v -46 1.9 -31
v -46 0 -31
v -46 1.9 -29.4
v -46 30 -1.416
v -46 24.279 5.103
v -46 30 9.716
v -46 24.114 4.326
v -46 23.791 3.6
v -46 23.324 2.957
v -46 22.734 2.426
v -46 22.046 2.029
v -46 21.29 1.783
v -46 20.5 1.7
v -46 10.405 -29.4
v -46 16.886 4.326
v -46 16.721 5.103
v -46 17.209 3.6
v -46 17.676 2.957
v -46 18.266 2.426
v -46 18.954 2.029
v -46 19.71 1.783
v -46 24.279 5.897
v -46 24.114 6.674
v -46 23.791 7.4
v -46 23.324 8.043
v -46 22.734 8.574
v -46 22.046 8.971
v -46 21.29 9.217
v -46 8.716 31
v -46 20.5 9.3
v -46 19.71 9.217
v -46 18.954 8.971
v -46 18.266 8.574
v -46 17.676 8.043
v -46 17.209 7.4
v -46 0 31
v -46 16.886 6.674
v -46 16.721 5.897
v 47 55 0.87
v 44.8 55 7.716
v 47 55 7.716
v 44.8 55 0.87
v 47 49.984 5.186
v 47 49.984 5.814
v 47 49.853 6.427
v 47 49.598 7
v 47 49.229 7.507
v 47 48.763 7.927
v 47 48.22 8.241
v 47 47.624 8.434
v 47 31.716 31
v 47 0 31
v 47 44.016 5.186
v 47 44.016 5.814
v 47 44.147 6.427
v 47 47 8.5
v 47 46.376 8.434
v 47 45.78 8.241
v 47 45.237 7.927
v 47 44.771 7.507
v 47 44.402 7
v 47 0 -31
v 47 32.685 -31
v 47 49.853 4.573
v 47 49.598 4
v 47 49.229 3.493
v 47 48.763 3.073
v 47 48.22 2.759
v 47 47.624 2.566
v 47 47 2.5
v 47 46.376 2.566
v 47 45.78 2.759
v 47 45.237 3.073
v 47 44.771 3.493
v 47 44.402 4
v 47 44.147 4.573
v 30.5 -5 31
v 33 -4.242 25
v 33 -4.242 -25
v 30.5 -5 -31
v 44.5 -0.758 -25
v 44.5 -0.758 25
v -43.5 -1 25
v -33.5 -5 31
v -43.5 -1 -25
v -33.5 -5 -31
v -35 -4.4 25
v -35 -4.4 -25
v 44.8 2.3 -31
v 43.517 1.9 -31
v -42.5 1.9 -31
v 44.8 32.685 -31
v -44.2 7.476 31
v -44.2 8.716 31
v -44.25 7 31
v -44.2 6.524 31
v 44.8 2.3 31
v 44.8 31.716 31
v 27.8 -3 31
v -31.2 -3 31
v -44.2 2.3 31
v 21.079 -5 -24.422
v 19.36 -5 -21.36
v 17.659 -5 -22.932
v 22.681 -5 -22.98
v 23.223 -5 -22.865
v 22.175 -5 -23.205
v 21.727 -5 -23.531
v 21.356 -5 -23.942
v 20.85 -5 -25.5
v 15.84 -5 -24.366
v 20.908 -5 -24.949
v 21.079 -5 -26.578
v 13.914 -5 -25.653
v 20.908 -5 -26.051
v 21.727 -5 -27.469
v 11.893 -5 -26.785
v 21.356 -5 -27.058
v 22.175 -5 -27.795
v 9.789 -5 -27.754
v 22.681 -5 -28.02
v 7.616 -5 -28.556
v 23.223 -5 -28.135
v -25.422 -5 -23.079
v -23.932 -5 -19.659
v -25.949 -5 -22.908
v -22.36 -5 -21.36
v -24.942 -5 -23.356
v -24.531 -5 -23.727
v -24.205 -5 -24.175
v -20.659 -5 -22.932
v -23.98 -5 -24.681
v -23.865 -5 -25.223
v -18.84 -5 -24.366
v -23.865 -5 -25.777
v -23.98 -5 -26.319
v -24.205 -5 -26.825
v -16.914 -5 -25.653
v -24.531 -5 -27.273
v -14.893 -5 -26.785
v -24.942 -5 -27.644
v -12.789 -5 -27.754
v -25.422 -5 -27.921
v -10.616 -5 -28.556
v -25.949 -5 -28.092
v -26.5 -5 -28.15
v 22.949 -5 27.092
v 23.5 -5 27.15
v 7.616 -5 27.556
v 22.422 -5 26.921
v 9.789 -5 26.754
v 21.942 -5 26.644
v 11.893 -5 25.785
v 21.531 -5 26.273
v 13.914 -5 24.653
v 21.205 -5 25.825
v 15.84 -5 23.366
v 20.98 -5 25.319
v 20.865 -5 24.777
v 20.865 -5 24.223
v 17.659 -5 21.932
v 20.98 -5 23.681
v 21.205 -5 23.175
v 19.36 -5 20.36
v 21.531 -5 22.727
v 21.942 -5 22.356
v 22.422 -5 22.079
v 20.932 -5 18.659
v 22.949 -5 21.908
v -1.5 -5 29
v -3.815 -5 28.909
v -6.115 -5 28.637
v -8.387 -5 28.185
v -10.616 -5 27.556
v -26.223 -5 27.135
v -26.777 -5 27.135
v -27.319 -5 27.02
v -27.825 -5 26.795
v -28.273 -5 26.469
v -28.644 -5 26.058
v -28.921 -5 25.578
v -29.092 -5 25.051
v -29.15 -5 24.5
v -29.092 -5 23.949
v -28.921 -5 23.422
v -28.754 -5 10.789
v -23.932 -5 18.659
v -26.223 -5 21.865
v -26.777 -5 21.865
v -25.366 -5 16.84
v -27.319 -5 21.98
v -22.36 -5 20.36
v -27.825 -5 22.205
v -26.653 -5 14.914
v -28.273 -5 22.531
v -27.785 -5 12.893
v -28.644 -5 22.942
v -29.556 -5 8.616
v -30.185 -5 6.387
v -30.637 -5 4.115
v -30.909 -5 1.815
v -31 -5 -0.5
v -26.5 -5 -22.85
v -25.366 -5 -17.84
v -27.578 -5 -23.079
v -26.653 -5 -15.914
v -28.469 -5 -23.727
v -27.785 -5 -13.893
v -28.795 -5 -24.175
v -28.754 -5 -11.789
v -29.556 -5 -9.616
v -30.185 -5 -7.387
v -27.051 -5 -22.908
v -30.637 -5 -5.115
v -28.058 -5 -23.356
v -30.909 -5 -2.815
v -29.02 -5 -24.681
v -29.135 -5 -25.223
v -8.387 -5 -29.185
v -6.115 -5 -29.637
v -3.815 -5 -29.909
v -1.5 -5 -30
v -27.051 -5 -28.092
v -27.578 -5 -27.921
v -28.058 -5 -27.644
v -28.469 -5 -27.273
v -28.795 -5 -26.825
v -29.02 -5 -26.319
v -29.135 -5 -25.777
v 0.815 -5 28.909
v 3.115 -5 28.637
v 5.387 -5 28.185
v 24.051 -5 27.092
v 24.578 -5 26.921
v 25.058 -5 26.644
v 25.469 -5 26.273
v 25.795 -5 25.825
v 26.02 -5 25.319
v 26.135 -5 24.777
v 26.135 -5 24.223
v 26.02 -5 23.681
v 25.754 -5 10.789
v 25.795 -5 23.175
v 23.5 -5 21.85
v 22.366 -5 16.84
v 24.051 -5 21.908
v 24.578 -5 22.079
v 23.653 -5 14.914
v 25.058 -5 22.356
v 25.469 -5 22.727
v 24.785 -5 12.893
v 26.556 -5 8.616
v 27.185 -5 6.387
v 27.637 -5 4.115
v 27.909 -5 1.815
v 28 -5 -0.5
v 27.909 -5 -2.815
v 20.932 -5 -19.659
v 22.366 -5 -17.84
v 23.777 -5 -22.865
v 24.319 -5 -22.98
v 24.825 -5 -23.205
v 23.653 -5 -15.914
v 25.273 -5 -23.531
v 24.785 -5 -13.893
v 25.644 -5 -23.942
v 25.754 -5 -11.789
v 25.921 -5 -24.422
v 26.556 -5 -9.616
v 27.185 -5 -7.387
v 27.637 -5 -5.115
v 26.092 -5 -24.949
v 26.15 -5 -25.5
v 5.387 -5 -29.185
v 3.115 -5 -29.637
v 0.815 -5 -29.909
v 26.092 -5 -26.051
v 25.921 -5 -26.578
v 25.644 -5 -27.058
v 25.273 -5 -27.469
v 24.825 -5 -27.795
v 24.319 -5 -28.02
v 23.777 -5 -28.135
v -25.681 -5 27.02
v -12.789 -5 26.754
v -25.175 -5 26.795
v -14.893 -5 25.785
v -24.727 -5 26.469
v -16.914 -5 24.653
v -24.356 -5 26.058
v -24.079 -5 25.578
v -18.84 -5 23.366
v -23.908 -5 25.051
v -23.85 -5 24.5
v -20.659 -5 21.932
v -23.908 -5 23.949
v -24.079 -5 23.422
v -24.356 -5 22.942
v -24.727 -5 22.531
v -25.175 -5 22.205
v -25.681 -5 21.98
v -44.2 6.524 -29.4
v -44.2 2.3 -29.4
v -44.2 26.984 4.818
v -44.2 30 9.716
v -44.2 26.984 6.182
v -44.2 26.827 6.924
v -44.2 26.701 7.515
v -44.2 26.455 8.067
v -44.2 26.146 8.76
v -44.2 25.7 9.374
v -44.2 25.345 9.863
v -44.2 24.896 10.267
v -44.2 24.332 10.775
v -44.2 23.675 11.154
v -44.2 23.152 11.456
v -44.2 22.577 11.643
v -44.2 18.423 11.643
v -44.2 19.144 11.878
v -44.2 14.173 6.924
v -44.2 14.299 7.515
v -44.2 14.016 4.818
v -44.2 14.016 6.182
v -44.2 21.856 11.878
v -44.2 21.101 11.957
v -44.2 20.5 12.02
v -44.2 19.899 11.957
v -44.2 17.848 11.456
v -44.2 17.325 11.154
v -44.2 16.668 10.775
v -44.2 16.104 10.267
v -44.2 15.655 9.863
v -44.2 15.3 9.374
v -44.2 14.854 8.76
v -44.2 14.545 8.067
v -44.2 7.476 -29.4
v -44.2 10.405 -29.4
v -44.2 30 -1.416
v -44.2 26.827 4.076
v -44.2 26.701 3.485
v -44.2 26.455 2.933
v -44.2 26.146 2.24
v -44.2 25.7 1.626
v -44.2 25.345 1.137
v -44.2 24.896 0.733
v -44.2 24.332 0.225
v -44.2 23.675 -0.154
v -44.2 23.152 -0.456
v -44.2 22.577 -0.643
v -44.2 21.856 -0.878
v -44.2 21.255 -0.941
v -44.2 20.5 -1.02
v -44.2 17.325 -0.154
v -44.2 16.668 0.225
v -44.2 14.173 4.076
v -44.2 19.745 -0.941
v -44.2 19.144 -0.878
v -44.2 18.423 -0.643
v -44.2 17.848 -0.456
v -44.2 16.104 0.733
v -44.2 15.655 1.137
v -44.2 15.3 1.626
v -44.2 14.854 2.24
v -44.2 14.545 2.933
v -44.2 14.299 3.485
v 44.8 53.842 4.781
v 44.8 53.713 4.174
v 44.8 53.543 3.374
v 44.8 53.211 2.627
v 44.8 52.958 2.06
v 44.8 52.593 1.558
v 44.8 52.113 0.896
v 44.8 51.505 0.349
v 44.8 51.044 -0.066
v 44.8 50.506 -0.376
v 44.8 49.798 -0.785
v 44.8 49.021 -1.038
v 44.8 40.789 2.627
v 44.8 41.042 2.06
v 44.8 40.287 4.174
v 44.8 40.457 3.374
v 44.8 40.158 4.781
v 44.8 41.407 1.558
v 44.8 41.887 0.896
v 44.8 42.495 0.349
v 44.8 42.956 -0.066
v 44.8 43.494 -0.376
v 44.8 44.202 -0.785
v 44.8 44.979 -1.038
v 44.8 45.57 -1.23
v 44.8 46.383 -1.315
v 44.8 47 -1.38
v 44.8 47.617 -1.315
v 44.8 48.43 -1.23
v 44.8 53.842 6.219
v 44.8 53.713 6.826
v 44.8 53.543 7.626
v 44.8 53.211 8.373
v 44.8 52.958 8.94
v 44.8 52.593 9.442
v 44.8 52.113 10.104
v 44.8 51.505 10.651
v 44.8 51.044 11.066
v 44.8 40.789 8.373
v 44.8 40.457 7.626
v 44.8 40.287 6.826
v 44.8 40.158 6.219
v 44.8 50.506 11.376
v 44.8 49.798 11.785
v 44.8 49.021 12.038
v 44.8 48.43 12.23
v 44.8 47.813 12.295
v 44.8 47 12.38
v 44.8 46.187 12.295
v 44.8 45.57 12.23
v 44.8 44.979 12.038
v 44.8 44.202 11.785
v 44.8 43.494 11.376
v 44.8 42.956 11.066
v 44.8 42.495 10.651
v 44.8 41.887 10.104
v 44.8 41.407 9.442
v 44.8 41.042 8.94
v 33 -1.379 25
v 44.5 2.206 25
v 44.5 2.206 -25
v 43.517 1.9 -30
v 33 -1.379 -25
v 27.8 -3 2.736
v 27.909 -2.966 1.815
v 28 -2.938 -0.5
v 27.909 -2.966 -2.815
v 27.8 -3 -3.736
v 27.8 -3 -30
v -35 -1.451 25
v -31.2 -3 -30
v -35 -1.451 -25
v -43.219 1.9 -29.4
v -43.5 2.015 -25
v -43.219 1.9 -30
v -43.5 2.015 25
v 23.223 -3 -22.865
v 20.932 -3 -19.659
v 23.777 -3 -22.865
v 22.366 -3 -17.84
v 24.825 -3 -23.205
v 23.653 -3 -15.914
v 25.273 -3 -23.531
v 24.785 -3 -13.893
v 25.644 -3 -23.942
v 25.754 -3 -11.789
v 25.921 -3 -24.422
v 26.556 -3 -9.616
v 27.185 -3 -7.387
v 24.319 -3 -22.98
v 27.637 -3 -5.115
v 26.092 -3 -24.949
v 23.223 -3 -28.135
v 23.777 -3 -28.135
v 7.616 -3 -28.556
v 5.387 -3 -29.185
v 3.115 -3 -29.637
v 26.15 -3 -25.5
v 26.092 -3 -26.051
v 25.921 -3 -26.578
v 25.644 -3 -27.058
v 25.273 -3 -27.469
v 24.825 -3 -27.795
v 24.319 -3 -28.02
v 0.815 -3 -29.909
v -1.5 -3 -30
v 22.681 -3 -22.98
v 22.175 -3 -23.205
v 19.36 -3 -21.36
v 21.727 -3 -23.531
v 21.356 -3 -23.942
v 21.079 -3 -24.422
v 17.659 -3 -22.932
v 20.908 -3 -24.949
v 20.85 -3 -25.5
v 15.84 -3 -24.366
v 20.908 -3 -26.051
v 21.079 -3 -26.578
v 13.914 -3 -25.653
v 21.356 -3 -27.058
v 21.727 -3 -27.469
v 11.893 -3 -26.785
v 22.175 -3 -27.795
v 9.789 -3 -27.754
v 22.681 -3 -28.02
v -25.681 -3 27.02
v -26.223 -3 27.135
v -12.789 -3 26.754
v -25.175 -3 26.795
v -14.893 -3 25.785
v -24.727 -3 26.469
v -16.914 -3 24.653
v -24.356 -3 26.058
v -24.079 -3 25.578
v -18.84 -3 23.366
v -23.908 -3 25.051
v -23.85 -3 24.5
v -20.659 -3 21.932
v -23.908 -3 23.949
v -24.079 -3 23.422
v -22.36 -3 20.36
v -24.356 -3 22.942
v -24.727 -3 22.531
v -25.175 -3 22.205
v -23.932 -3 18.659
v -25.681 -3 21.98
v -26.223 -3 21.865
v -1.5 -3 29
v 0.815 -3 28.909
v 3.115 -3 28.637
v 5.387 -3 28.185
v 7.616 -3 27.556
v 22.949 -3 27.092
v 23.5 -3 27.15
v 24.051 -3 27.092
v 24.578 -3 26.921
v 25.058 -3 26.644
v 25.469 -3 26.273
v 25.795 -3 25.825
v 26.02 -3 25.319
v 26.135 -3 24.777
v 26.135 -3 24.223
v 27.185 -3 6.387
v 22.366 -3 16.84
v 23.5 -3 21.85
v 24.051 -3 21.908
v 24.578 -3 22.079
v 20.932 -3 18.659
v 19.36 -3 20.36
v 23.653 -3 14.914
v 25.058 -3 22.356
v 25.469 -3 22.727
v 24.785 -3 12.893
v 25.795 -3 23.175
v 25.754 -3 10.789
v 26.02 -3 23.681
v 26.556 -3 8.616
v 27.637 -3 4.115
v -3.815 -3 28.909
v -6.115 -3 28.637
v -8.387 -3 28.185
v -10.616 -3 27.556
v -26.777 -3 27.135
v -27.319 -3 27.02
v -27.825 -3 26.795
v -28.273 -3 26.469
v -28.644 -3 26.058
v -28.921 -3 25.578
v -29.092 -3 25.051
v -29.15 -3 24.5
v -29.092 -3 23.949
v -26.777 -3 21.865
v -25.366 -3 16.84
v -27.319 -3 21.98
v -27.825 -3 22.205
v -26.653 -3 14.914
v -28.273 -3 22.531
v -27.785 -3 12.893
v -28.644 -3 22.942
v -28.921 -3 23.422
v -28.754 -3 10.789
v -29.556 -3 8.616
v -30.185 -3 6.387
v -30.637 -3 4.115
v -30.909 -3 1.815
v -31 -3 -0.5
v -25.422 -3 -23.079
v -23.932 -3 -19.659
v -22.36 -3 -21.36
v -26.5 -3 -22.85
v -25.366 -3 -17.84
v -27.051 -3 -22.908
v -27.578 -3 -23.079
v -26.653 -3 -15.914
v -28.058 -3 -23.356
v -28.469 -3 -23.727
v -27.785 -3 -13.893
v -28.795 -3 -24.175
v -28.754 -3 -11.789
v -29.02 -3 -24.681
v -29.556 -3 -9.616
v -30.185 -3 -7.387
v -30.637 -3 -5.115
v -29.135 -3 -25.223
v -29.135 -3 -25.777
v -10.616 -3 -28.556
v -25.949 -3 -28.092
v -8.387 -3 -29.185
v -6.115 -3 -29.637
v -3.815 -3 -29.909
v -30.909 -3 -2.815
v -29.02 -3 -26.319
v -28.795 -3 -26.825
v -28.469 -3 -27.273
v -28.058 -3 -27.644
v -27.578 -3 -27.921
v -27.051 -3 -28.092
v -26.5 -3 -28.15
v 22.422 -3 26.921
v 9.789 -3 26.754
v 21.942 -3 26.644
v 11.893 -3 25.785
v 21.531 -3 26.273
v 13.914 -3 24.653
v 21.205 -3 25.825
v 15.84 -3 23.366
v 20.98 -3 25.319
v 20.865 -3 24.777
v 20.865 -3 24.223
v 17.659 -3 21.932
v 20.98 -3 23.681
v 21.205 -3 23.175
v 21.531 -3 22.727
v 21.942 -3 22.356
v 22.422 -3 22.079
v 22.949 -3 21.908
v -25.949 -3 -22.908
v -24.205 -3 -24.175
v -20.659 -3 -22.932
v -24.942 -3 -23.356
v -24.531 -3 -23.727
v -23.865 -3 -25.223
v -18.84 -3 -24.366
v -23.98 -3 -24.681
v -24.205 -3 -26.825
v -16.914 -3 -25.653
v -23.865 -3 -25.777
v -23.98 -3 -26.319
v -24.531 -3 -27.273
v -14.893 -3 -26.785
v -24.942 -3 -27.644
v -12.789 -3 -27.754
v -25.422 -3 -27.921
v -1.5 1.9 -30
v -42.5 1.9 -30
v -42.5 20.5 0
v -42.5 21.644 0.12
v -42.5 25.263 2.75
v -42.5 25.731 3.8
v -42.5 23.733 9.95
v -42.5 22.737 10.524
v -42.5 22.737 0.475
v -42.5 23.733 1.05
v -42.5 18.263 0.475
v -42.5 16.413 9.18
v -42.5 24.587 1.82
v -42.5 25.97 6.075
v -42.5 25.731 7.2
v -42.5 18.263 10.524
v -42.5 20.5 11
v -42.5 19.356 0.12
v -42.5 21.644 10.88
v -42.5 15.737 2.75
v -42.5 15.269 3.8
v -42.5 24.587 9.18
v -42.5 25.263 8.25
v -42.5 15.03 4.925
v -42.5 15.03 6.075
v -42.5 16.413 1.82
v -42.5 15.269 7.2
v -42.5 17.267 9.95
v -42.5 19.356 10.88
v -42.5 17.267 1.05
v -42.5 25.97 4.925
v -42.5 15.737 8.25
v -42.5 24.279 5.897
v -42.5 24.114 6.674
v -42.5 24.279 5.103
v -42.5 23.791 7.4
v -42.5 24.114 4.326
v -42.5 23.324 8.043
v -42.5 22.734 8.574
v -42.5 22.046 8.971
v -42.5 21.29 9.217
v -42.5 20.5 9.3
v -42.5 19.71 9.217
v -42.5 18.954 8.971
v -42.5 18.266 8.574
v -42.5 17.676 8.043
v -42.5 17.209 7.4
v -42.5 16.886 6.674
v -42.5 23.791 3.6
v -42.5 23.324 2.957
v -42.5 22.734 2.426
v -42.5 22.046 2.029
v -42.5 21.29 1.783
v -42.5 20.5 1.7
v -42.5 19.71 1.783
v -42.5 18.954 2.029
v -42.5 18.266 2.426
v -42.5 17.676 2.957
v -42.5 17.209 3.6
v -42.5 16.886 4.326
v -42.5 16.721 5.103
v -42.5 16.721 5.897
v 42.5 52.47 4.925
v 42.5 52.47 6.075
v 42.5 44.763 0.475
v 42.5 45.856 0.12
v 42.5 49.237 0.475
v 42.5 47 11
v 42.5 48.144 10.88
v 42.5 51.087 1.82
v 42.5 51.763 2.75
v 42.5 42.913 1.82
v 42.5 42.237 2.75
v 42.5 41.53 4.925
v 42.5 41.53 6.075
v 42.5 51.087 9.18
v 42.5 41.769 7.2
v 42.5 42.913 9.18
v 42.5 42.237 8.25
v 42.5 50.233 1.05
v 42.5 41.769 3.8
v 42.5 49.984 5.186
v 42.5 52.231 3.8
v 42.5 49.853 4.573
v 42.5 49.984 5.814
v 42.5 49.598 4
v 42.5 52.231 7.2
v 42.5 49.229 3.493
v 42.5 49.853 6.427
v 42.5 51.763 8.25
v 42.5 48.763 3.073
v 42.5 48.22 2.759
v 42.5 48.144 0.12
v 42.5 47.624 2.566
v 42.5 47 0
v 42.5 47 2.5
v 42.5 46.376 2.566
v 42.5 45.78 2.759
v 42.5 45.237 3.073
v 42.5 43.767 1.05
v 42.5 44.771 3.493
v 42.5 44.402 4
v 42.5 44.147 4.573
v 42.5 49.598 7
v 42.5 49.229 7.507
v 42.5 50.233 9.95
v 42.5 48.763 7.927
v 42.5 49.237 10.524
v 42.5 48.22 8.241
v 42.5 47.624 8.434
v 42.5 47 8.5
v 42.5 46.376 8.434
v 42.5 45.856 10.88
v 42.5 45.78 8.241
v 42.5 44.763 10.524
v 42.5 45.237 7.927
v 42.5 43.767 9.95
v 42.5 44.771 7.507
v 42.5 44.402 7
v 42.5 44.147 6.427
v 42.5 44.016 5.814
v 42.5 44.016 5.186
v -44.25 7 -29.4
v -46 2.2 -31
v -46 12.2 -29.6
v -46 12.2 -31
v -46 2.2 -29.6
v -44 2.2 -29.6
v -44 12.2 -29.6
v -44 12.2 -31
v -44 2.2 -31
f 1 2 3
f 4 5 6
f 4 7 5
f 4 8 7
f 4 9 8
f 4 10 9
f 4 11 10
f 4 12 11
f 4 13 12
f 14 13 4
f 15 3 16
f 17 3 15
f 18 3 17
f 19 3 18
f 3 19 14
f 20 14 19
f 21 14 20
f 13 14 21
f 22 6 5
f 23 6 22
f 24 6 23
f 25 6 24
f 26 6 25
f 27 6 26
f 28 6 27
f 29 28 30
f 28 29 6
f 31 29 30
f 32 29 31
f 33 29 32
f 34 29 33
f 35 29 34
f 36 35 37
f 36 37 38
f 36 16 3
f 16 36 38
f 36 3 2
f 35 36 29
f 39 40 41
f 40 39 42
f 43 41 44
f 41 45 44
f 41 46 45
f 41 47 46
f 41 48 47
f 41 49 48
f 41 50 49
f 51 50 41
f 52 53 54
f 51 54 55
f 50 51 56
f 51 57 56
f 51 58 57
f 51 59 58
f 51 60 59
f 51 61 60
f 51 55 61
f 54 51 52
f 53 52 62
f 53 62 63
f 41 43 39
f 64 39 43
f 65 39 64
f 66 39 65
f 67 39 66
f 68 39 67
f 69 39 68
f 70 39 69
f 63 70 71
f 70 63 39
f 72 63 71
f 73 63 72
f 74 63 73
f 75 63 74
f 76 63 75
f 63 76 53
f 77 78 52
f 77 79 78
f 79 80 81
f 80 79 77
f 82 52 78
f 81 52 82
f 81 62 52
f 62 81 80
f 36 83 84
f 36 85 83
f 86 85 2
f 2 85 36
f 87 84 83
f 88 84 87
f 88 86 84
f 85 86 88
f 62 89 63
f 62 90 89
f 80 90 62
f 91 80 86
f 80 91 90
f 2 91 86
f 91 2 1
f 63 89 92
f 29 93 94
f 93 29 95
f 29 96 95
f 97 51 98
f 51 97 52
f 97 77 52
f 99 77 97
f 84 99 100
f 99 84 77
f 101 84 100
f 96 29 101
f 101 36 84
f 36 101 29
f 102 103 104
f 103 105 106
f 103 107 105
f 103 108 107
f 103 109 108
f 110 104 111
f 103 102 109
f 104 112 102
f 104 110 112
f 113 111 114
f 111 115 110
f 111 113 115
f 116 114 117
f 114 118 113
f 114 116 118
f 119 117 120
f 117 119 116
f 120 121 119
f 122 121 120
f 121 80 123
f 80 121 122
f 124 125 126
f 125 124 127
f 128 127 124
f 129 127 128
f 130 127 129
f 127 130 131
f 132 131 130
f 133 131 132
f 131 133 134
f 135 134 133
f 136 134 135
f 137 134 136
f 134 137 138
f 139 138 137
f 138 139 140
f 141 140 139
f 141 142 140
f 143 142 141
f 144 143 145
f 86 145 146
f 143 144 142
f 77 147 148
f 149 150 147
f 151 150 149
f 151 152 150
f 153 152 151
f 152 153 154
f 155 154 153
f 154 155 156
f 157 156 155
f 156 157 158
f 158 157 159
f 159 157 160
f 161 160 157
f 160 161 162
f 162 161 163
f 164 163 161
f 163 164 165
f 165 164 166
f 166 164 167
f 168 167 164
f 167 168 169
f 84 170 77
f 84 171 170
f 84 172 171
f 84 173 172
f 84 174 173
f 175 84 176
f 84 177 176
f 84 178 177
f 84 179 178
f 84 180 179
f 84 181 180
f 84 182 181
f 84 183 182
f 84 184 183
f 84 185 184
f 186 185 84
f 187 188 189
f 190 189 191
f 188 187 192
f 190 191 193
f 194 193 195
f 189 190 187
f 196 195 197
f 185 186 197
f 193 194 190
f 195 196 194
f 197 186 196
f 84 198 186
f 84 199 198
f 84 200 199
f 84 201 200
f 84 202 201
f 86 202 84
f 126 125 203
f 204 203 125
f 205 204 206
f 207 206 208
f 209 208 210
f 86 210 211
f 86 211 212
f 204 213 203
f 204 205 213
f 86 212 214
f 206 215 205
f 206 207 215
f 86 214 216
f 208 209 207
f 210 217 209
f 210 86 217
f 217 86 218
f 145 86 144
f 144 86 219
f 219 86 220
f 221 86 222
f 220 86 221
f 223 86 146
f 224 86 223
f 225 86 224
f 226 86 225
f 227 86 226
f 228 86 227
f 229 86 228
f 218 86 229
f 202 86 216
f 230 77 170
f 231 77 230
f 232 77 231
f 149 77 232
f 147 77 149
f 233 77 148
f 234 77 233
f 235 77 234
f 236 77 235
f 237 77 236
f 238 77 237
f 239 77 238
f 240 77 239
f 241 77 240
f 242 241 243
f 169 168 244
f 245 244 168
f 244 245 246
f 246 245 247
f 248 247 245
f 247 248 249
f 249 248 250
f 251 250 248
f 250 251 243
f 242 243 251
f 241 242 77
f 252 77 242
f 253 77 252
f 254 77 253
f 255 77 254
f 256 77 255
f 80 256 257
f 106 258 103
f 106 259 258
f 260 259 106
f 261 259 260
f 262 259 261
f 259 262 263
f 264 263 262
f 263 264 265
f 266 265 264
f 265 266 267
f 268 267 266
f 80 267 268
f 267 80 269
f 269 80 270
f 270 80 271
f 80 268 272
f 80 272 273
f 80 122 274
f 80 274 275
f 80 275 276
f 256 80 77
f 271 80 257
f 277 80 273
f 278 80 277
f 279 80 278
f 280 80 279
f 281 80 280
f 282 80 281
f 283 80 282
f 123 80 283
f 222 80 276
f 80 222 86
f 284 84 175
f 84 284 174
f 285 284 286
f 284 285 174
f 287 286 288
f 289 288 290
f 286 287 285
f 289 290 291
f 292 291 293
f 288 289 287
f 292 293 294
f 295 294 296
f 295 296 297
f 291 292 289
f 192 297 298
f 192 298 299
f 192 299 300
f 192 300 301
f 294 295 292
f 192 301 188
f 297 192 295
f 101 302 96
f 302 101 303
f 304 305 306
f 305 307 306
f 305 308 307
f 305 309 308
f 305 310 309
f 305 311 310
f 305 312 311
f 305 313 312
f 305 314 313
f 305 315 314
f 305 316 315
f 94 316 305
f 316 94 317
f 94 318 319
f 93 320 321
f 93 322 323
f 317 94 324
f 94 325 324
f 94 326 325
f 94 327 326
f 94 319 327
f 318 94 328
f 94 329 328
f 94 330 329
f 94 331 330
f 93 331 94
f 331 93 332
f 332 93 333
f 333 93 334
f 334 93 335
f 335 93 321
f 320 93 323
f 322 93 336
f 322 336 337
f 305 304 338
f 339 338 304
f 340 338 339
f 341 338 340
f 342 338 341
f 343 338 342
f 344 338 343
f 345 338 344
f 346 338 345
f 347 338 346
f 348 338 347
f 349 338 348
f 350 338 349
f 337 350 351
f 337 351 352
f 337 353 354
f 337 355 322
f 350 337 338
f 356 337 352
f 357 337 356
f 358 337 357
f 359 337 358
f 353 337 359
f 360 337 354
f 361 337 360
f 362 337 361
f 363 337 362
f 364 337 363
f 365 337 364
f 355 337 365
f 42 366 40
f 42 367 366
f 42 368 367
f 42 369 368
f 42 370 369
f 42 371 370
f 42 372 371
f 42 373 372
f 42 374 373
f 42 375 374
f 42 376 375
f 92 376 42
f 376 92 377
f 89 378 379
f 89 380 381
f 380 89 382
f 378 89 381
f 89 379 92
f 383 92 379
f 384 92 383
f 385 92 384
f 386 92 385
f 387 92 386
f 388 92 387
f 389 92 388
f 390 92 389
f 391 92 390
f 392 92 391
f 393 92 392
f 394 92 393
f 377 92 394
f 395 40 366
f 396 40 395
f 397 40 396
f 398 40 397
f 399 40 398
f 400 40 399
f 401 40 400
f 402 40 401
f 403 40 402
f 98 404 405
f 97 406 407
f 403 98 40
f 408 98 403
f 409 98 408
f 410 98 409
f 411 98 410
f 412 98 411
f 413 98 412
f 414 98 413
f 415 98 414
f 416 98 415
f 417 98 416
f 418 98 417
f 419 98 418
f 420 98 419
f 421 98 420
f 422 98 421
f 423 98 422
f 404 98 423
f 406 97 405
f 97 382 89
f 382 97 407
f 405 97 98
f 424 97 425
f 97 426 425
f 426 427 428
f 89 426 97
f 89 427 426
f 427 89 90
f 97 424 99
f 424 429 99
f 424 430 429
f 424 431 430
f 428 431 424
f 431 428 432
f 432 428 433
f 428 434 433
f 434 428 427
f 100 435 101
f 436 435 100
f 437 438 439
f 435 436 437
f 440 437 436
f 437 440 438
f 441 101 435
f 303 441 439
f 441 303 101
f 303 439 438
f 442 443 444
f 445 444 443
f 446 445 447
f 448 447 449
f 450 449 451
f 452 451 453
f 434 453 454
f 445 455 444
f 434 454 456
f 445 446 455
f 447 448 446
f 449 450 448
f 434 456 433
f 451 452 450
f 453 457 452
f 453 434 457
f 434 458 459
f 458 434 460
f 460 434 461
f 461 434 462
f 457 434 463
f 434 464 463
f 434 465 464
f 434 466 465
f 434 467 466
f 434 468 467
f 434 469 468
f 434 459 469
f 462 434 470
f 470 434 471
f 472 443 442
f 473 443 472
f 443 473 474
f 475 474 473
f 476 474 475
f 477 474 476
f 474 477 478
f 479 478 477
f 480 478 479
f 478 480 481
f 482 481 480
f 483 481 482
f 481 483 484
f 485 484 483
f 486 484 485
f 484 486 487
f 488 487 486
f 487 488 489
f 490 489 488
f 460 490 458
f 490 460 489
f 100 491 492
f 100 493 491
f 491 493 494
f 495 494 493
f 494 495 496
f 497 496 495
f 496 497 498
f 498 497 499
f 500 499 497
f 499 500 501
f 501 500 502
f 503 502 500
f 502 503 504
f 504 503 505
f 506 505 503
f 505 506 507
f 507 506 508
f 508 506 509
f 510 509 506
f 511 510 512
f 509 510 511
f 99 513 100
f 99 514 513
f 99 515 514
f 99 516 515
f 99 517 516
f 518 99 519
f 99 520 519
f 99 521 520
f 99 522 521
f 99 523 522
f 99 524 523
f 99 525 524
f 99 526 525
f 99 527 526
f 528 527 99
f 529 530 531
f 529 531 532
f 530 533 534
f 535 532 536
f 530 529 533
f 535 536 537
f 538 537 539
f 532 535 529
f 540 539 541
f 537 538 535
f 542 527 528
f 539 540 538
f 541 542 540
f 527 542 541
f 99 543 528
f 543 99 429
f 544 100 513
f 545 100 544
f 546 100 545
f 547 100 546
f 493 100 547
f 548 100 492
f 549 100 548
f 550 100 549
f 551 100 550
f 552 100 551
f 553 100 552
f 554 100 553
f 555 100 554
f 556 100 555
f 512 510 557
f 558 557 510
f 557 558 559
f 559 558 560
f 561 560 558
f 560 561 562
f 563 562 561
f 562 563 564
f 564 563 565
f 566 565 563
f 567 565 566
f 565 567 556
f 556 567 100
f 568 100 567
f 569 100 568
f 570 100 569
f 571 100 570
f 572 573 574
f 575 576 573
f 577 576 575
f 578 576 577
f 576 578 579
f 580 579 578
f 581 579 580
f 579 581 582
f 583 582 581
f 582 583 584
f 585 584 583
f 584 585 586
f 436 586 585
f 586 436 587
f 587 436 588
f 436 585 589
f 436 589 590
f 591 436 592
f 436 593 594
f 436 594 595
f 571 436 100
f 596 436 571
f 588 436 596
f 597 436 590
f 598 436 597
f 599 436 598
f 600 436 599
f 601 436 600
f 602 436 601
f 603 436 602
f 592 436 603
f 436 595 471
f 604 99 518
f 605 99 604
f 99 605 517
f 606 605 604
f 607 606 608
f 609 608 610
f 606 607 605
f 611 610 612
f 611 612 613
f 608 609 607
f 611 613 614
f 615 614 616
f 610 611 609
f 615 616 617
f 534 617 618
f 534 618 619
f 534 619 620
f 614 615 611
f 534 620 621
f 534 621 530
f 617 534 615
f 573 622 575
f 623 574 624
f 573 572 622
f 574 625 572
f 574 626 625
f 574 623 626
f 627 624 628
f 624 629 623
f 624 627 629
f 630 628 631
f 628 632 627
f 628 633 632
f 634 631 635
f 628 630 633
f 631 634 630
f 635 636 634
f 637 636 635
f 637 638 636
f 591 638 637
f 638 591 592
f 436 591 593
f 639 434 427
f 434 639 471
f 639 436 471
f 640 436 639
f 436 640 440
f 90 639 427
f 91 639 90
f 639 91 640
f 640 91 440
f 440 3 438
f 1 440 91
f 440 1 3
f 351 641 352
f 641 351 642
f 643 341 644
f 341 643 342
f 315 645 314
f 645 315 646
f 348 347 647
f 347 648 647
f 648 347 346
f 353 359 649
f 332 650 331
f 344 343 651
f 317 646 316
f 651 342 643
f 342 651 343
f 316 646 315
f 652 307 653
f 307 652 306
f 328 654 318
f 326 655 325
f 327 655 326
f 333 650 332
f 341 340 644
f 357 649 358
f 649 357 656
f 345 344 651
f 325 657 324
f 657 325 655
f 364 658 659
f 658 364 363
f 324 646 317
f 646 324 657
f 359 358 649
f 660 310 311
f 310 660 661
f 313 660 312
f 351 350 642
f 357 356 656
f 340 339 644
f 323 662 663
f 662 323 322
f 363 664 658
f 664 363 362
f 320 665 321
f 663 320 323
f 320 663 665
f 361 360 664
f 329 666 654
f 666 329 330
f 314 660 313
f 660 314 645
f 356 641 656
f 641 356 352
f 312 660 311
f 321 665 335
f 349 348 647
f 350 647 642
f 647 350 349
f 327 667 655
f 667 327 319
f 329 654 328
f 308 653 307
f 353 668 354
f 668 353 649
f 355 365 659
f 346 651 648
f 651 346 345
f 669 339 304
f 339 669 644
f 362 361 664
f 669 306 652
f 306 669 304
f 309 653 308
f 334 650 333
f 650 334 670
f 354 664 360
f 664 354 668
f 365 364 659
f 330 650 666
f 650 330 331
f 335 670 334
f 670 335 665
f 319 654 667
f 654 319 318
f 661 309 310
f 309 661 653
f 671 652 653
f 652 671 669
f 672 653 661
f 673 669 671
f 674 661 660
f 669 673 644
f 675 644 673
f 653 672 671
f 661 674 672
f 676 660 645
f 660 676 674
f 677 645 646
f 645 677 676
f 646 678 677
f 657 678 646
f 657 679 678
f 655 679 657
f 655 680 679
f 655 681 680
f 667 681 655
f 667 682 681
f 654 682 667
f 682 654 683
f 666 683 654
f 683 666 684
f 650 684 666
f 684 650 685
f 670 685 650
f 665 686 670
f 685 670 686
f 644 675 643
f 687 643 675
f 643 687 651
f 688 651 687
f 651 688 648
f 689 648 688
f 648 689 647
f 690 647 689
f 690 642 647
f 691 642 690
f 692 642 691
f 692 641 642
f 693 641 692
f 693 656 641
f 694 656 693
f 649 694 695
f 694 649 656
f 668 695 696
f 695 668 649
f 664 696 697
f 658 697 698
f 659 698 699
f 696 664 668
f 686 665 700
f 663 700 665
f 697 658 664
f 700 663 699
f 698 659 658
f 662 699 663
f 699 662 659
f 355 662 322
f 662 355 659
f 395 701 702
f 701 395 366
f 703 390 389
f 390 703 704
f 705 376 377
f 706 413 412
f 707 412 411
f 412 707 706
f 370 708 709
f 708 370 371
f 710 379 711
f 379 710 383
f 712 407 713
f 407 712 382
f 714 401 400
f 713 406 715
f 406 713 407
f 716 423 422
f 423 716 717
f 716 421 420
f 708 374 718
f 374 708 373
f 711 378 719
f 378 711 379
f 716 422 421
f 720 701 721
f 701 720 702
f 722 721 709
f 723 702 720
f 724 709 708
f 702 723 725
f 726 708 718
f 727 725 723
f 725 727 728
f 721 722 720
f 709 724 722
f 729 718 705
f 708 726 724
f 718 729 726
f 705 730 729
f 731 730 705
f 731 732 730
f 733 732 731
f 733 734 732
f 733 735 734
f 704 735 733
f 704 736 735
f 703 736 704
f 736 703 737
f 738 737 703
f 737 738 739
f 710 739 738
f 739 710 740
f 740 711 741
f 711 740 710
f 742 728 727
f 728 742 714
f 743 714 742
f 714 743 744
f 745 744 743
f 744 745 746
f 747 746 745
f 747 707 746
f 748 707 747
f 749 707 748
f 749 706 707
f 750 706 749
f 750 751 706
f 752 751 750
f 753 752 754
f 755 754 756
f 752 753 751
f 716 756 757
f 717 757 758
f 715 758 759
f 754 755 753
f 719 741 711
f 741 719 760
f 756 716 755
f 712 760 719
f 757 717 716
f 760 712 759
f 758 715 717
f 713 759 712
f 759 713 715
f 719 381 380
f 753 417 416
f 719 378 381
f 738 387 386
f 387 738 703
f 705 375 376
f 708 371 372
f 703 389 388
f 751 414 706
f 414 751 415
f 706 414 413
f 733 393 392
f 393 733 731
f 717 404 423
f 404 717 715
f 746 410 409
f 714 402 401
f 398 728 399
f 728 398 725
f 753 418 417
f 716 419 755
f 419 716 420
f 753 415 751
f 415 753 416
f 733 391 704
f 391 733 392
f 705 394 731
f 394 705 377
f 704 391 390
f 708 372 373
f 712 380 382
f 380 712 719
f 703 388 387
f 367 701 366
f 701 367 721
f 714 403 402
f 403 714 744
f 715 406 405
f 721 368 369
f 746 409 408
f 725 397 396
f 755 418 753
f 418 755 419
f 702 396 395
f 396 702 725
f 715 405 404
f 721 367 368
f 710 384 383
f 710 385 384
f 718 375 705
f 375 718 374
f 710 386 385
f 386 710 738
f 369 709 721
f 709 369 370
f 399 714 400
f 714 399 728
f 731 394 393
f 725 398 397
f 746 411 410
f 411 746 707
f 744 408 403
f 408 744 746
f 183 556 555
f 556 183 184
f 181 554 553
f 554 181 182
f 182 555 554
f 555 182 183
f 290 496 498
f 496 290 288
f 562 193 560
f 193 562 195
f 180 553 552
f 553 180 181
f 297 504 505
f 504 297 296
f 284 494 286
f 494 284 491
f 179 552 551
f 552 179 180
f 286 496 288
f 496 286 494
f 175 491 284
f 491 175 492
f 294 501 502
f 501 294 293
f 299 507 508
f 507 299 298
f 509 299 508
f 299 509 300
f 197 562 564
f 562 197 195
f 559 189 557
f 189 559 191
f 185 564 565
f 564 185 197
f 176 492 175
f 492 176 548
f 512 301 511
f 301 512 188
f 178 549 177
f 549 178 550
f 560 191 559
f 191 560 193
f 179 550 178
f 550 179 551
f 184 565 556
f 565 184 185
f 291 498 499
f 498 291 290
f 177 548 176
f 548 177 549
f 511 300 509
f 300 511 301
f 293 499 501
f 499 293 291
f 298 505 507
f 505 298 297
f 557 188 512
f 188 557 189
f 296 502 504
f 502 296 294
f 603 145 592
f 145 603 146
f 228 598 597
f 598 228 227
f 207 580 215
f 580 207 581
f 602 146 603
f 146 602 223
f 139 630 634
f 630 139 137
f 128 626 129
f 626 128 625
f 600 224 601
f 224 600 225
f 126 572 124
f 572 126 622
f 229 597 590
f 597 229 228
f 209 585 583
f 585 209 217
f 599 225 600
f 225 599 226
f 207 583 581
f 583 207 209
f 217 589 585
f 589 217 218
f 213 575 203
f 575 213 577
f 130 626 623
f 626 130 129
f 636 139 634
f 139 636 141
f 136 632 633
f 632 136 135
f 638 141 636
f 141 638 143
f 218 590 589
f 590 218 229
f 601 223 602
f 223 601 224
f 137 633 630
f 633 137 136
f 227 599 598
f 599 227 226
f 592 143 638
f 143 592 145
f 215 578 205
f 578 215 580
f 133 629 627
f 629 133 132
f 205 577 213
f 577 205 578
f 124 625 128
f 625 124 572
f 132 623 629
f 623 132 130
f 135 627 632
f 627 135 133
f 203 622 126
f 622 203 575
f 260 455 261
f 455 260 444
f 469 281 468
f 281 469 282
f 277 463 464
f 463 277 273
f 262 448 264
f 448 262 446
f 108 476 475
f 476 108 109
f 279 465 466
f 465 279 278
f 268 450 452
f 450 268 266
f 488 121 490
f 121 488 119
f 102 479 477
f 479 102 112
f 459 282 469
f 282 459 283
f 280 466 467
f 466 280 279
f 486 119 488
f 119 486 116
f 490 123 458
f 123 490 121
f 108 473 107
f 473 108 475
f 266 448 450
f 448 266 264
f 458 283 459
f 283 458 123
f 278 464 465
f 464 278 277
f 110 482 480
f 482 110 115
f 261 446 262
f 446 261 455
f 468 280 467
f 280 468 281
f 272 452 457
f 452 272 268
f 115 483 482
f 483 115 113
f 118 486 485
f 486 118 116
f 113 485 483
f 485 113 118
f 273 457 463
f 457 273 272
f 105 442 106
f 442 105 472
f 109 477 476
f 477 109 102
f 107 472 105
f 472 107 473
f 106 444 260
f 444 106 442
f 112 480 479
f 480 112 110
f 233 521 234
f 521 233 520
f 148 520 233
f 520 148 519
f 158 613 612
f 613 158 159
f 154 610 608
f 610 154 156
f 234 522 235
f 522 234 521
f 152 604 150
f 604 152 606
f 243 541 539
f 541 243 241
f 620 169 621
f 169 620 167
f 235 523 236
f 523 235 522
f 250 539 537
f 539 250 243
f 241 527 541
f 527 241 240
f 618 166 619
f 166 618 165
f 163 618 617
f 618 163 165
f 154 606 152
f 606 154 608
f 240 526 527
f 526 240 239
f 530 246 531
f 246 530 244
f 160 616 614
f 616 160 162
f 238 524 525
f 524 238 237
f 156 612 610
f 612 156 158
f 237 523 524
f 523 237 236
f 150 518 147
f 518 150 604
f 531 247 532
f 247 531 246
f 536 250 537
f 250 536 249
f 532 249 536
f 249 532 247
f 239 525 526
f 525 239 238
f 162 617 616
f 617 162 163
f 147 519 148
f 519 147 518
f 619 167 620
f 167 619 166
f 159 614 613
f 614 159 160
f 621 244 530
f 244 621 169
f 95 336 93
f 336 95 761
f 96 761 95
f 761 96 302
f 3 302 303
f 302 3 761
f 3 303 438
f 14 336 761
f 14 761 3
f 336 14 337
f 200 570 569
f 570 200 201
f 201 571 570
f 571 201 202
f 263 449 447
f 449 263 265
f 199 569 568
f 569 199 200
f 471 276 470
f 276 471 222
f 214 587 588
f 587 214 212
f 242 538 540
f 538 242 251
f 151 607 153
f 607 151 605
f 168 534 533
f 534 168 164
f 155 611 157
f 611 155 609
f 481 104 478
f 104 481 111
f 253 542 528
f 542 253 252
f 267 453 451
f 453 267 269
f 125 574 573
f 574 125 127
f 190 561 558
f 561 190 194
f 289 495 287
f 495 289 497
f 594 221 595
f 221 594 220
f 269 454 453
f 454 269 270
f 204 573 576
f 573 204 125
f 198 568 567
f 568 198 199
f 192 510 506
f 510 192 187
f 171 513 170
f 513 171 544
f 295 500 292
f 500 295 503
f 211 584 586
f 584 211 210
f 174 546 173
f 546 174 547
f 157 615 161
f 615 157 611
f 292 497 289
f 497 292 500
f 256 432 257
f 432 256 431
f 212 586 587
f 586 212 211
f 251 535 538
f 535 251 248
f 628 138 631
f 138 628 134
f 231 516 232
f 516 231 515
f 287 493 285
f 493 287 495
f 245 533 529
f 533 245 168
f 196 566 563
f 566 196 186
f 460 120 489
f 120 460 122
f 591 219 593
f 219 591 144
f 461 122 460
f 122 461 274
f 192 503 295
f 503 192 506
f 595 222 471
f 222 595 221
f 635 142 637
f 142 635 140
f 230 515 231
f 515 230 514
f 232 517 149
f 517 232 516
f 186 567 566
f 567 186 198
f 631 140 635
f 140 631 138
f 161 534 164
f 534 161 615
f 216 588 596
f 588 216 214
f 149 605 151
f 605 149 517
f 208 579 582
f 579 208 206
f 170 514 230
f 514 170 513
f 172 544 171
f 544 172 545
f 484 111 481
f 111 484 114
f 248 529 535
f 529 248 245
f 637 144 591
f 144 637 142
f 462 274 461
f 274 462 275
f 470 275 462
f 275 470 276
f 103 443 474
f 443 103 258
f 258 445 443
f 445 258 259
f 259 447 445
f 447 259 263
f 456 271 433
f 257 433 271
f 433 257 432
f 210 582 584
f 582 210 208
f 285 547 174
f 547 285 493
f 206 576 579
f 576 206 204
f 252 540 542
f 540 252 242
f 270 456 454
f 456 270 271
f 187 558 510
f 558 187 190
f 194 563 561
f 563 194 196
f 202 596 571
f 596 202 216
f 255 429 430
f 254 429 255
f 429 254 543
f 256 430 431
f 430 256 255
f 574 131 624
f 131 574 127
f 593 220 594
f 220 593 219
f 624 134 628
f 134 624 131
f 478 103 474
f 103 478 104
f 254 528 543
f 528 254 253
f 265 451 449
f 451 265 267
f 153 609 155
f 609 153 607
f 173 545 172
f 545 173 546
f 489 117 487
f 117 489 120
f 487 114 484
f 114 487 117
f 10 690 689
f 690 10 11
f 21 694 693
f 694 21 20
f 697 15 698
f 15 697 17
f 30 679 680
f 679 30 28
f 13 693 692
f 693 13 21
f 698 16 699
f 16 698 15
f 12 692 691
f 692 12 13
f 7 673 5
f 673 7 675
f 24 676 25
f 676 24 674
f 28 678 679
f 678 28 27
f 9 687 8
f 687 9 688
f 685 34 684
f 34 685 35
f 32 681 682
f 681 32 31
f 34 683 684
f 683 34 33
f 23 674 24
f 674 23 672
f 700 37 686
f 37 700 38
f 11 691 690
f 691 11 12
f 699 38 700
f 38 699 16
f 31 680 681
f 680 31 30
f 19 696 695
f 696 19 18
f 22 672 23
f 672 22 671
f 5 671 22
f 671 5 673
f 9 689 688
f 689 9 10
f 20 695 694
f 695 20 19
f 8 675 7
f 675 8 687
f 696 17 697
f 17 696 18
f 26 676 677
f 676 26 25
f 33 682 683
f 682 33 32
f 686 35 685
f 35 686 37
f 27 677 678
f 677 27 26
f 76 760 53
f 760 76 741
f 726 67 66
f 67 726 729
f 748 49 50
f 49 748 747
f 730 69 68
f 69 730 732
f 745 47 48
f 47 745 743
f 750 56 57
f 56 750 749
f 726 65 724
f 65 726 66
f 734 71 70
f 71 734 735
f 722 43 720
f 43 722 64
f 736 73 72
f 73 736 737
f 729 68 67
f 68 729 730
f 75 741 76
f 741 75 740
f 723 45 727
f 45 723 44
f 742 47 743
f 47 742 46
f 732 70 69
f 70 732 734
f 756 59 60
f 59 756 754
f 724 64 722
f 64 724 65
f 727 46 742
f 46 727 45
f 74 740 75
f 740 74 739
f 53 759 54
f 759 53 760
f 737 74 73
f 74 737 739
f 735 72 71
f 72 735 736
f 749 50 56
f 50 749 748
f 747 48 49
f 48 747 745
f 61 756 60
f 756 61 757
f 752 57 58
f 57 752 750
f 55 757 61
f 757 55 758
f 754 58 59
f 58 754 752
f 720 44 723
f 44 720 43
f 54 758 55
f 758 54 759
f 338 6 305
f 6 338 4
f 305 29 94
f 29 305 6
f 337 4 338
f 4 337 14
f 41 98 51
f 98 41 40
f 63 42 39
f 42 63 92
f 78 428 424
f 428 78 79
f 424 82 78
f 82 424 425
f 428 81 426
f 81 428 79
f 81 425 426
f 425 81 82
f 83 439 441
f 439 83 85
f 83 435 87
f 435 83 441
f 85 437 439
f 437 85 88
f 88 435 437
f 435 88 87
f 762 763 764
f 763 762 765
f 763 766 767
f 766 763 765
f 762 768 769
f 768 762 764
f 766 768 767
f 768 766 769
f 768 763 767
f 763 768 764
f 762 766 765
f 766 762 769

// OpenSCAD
// file: common.scad
atx_psu_width = 150;
atx_psu_height = 86;

card_spacing = 20.32;

fan_connector_width = 6.1;
fan_connector_length = 7.9;

fan_92mm = 92;
fan_92mm_bolt_offset = 82.5/2;

module mock_mobo() {
    $fn=50;
    difference() {
        cube([304.8, 243.84, 2]);
        translate([6.35+281.94,10.16,0]) cylinder(d=4, h=3);
        translate([6.35+281.94,10.16+154.94,0]) cylinder(d=4, h=3);
        translate([6.35+281.94,10.16+227.33,0]) cylinder(d=4, h=3);

        translate([6.35+157.48+45.72,10,0]) cylinder(d=4, h=3);

        translate([6.35+157.48,10.16,0]) cylinder(d=4, h=3);
        translate([6.35+157.48,10.16+154.94,0]) cylinder(d=4, h=3);
        translate([6.35+157.48,10.16+227.33,0]) cylinder(d=4, h=3);

        translate([6.35,22.86,0]) cylinder(d=4, h=3);
        translate([6.35,10.16+154.94,0]) cylinder(d=4, h=3);
        translate([6.35,10.16+227.33,0]) cylinder(d=4, h=3);
    }
}

module mock_card() {
    $fn=50;
    cube([200, 2, 106.7]);
    translate([-12.3, -15.8+22-19.4, -18.8+119.2]) difference() {
        cube([12.3,19.4,1]);
        translate([6.3, 19.4-1-4.8/2,0]) hull() {
            cylinder(d=4.8,h=2, $fn=40);
            translate([0,5,0]) cylinder(d=4.8,h=2, $fn=40);
        }
    }
    difference() {
        translate([-1,-15.8, -18.8]) cube([1,22, 120.2]);
        translate([-1.3,-15.8, -18.8]) cube([2,(18.8-10.6)/2, 11.2]);
        translate([-1.3,-15.8+10.6+(18.8-10.6)/2, -18.8]) cube([2,(18.8-10.6)/2, 11.2]);
        translate([-1.3,-15.8+18.8, -18.8]) cube([2,5, 116.2]);
        translate([-1.3,-15.8, -18.8+116.2]) cube([2,22-18.8, 5]);
    }
    
}

module mock_mobo_card() {
    
    mock_mobo();
    translate([304.8-142,-1.2,18.8-10.4]) rotate([0,0,90]) mock_card();
    translate([304.8-142+card_spacing,-1.2,18.8-10.4]) rotate([0,0,90]) mock_card();
    translate([304.8-142+2*card_spacing,-1.2,18.8-10.4]) rotate([0,0,90]) mock_card();
    translate([304.8-142+3*card_spacing,-1.2,18.8-10.4]) rotate([0,0,90]) mock_card();
    translate([304.8-142+4*card_spacing,-1.2,18.8-10.4]) rotate([0,0,90]) mock_card();
    translate([304.8-142+5*card_spacing,-1.2,18.8-10.4]) rotate([0,0,90]) mock_card();
    translate([304.8-142+6*card_spacing,-1.2,18.8-10.4]) rotate([0,0,90]) mock_card();
}

module mock_ssd() {
    difference() {
        cube([70, 100, 7.1]);
        translate([9.4,0,6.5]) cube([41.4,7,1]);
        translate([10.4,0,0]) cube([39.4,7,2]);
    }
    translate([0,13.6,3]) rotate([0,-90,0]) cylinder(d=2.5, h=5, $fn=30);
    translate([0,100-9.2,3]) rotate([0,-90,0]) cylinder(d=2.5, h=5, $fn=30);

    translate([70+5,13.6,3]) rotate([0,-90,0]) cylinder(d=2.5, h=5, $fn=30);
    translate([70+5,100-9.2,3]) rotate([0,-90,0]) cylinder(d=2.5, h=5, $fn=30);

}


hd_width = 102;
hd_height = 26.1;

screw_dia = 3.6;

module mock_hd() {
    color("white") difference() {
        cube([hd_width,146,26]);
        translate([0,28.3,6.40]) rotate([0,90,0]) cylinder(d=screw_dia, h=5, $fn=30);
        translate([0,69.8,6.40]) rotate([0,90,0]) cylinder(d=screw_dia, h=5, $fn=30);
        translate([0,129.8,6.40]) rotate([0,90,0]) cylinder(d=screw_dia, h=5, $fn=30);

        translate([hd_width-5,28.3,6.40]) rotate([0,90,0]) cylinder(d=screw_dia, h=5, $fn=30);
        translate([hd_width-5,69.8,6.40]) rotate([0,90,0]) cylinder(d=screw_dia, h=5, $fn=30);
        translate([hd_width-5,129.8,6.40]) rotate([0,90,0]) cylinder(d=screw_dia, h=5, $fn=30);

    }
        
}

module minus_atx_psu_holes(hole=3.2) {
    difference() {
        children();
        translate([-138/2,0,6]) rotate([-90,0,0]) cylinder(d=hole, h=5, $fn=30);
        translate([138/2,0,6]) rotate([-90,0,0]) cylinder(d=hole, h=5, $fn=30);
        translate([138/2,0,6+64]) rotate([-90,0,0]) cylinder(d=hole, h=5, $fn=30);
        translate([-150/2+30,0,atx_psu_height-6]) rotate([-90,0,0]) cylinder(d=hole, h=5, $fn=30);
    }
}

module mock_atx_psu(holes=true, slop=0) {
    w = atx_psu_width+2*slop;
    h = atx_psu_height+2*slop;
    if (holes) {
        minus_atx_psu_holes() {
            translate([-w/2,0,0]) cube([w, 140, h]);
        }
    } else {
        translate([-w/2,0,0]) cube([w, 140, h]);
    }
}


module mock_fan_connector_male(slop=0.2) {
    
    module pin() {
        color("grey") cube([0.75,0.75,14.3],center=true);
    }
    
    w = fan_connector_width + slop;
    l = fan_connector_length + slop;
    
    pin_offset = (5.8-0.75)/2;
    union() {
        color("white") {
            translate([0,0,3.2/2]) cube([w, l,3.2], center=true);
            translate([-w/2+0.9/2,0,3.2+8.5/2]) cube([0.9,5,8.5],center=true);
            translate([-w/2+0.9+0.3/2,0,1.7/2+5.7]) cube([0.3,5,1.7],center=true);
        }
        
        translate([-w/2+2.4,0,14.3/2-3.6]) pin();
        translate([-w/2+2.4,pin_offset,14.3/2-3.6]) pin();
        translate([-w/2+2.4,-pin_offset,14.3/2-3.6]) pin();
    }
}


//mock_mobo();
//mock_card();
//mock_mobo_card();
//mock_ssd();
//mock_atx_psu();
//mock_fan_connector_male();
// main file
use <common.scad>;

//mock_sockets();
//mock_cooler();
//mockup();


//fan_mount();
fan_mount_2();


module mock_sockets() {
    module _socket_holes() {

        cylinder(d=3, h=10, center=true, $fn=20);

        translate([80, 0, 0])
        cylinder(d=3, h=10, center=true, $fn=20);

        translate([0, 80, 0])
        cylinder(d=3, h=10, center=true, $fn=20);

        translate([80, 80, 0])
        cylinder(d=3, h=10, center=true, $fn=20);

        translate([15.7, 135.3, 0])
        cylinder(d=3, h=10, center=true, $fn=20);

        translate([80 + 15.7, 135.3, 0])
        cylinder(d=3, h=10, center=true, $fn=20);

        translate([15.7, 80 + 135.3, 0])
        cylinder(d=3, h=10, center=true, $fn=20);

        translate([80 + 15.7, 80 + 135.3, 0])
        cylinder(d=3, h=10, center=true, $fn=20);
    }

//    difference() {
//        scale([0.862, 0.858, 1])
//        translate([-9.5, -31.7, 0])
//        import("Supermicro_sockets.svg");
//
//        _socket_holes();
//    }
    _socket_holes();
}

module mock_cooler() {
    difference() {
        translate([0, 0, 64/2])
        cube([90, 90, 64], center=true);

        translate(
            [90/2 + 13/2 - 12,
             90/2 + 10/2 - 9.5,
            65/2 + 3.5])
        cube([13, 10, 65], center=true);

        translate(
            [90/2 + 13/2 - 12,
             -90/2 - 10/2 + 9.5,
            65/2 + 3.5])
        cube([13, 10, 65], center=true);

        translate(
            [-90/2 - 13/2 + 12,
             -90/2 - 10/2 + 9.5,
            65/2 + 3.5])
        cube([13, 10, 65], center=true);

        translate(
            [-90/2 - 13/2 + 12,
             90/2 + 10/2 - 9.5,
            65/2 + 3.5])
        cube([13, 10, 65], center=true);

        translate([90/2, 0, 100/2 + 3.5])
        cube([6, 200, 100], center=true);

        translate([-80/2, -80/2, 0])
        cylinder(d=4, h=20, center=true, $fn=30);

        translate([80/2, -80/2, 0])
        cylinder(d=4, h=20, center=true, $fn=30);

        translate([80/2, 80/2, 0])
        cylinder(d=4, h=20, center=true, $fn=30);

        translate([-80/2, 80/2, 0])
        cylinder(d=4, h=20, center=true, $fn=30);
        
    }

    translate([90/2 - 2, -90/2 + 9.5 + 9, 38.5]) {
        sphere(d=7.5, $fn=30);

        rotate([0, -90, 0])
        cylinder(d=7.5, h=10, $fn=30);
    }

    translate([90/2 - 2, 90/2 - 9.5 - 9, 38.5]) {
        sphere(d=7.5, $fn=30);

        rotate([0, -90, 0])
        cylinder(d=7.5, h=10, $fn=30);
    }

    translate([-90/2, 0, 38.5])
    sphere(d=6, $fn=30);

    translate([-80/2, -80/2, 3])
    cylinder(d=8, h=20, $fn=30);

    translate([80/2, -80/2, 0])
    cylinder(d=8, h=20, $fn=30);

    translate([80/2, 80/2, 0])
    cylinder(d=8, h=20, $fn=30);

    translate([-80/2, 80/2, 0])
    cylinder(d=8, h=20, $fn=30);
}

module mockup() {

    translate([-80/2, -80/2, 0])
    mock_sockets();
    
    translate([15.7, 135.3, 0])
    rotate([0, 0, 180])
    mock_cooler();

    mock_cooler();

    translate([0, -65, 33])
    rotate([90, 0, 0])
    mock_fan_60mm();

    translate([-1, -90/2 - 2, 62/2 + 2])
    fan_mount();

    translate([15.7, 135.8 - 65, 33])
    rotate([90, 0, 0])
    mock_fan_60mm();

    translate([16.7, 135.3 - 90/2 - 2, 62/2 + 2])
    mirror([1, 0, 0])
    fan_mount(fan_offset=1.5);
}

module fan_mount(fan_offset=0) {
    difference() {
        union() {
            hull() {
                translate([-1/2, 55/2, 0])
                cube([90 + 4 - 1, 55, 62], center=true);

                translate([fan_offset, -5/2, 0])
                cube([64, 5, 62], center=true);
            }

            translate([80/2, 7, 0])
            cylinder(d=12, h=62, center=true, $fn=30);
        }

        translate([80/2, 7, 0])
        cylinder(d=8.5, h=63, center=true, $fn=30);

        // inner block removed
        difference() {
            hull() {
                translate([-1/2 + 0.2, 55/2 + 2.3, 0])
                cube([90 - 1, 55, 63], center=true);

                translate([fan_offset + 0.2, -5/2 + 2, 0])
                cube([59, 5, 63], center=true);
            }
            translate([0, -10/2 + 1.9, -62/2])
            cube([100, 10, 2], center=true);

            translate([90/2, 20.5, 5.5])
            rotate([0, 90, 0])
            cylinder(d1=11, d2=17, h=5, center=true, $fn=30);

            translate([-90/2, 47, 5.5])
            rotate([0, -90, 0])
            cylinder(d1=11, d2=17, h=5, center=true, $fn=30);
        }

        translate([90/2, 6.9, -62/2])
        cube([5, 10, 3.2], center=true);

        translate([fan_offset, 0, -(62 - 59)/2 + 1])
        rotate([90, 0, 0])
        cylinder(d=59, h=100, center=true, $fn=80);

        translate([fan_offset, 0, -(62 - 59)/2 + 1])
        for(i = [0:3]) {
            rotate([90, i * 90, 0])
            translate([50/2, 50/2, 0])
            cylinder(d=5.3, h=20, center=true, $fn=30);
        }

        translate([90/2, 20.5, 5.5])
        rotate([0, 90, 0])
        cylinder(d=7.6, h=10, center=true, $fn=30);

        translate([-90/2, 47, 5.5])
        rotate([0, 90, 0])
        cylinder(d=6, h=10, center=true, $fn=30);

        translate([90/2, 50, 0])
        cube([20, 40, 100], center=true);

        translate([90/2, 36, 32])
        rotate([45, 0, 0])
        cube([20, 40, 40], center=true);

        translate([90/2, 33, -32])
        rotate([55, 0, 0])
        cube([20, 50, 40], center=true);

        translate([-90/2, 59, 32])
        rotate([45, 0, 0])
        cube([20, 40, 40], center=true);

        translate([-90/2, 56.4, -32])
        rotate([55, 0, 0])
        cube([20, 55, 40], center=true);

        translate([-39 - 1/2 + fan_offset/2, 0, 0])
        cube([10 + fan_offset, 20, 50], center=true);

        translate([39 - 1/2 + fan_offset/2, 0, 0])
        cube([10 - fan_offset, 20, 50], center=true);
    }

    // support
    translate([90/2, 7.2, -62/2 + 1.4/2])
    cube([2, 10, 1.4], center=true);
}

module fan_mount_2() {
    mirror([1, 0, 0])
    fan_mount(fan_offset=1.5);
}
